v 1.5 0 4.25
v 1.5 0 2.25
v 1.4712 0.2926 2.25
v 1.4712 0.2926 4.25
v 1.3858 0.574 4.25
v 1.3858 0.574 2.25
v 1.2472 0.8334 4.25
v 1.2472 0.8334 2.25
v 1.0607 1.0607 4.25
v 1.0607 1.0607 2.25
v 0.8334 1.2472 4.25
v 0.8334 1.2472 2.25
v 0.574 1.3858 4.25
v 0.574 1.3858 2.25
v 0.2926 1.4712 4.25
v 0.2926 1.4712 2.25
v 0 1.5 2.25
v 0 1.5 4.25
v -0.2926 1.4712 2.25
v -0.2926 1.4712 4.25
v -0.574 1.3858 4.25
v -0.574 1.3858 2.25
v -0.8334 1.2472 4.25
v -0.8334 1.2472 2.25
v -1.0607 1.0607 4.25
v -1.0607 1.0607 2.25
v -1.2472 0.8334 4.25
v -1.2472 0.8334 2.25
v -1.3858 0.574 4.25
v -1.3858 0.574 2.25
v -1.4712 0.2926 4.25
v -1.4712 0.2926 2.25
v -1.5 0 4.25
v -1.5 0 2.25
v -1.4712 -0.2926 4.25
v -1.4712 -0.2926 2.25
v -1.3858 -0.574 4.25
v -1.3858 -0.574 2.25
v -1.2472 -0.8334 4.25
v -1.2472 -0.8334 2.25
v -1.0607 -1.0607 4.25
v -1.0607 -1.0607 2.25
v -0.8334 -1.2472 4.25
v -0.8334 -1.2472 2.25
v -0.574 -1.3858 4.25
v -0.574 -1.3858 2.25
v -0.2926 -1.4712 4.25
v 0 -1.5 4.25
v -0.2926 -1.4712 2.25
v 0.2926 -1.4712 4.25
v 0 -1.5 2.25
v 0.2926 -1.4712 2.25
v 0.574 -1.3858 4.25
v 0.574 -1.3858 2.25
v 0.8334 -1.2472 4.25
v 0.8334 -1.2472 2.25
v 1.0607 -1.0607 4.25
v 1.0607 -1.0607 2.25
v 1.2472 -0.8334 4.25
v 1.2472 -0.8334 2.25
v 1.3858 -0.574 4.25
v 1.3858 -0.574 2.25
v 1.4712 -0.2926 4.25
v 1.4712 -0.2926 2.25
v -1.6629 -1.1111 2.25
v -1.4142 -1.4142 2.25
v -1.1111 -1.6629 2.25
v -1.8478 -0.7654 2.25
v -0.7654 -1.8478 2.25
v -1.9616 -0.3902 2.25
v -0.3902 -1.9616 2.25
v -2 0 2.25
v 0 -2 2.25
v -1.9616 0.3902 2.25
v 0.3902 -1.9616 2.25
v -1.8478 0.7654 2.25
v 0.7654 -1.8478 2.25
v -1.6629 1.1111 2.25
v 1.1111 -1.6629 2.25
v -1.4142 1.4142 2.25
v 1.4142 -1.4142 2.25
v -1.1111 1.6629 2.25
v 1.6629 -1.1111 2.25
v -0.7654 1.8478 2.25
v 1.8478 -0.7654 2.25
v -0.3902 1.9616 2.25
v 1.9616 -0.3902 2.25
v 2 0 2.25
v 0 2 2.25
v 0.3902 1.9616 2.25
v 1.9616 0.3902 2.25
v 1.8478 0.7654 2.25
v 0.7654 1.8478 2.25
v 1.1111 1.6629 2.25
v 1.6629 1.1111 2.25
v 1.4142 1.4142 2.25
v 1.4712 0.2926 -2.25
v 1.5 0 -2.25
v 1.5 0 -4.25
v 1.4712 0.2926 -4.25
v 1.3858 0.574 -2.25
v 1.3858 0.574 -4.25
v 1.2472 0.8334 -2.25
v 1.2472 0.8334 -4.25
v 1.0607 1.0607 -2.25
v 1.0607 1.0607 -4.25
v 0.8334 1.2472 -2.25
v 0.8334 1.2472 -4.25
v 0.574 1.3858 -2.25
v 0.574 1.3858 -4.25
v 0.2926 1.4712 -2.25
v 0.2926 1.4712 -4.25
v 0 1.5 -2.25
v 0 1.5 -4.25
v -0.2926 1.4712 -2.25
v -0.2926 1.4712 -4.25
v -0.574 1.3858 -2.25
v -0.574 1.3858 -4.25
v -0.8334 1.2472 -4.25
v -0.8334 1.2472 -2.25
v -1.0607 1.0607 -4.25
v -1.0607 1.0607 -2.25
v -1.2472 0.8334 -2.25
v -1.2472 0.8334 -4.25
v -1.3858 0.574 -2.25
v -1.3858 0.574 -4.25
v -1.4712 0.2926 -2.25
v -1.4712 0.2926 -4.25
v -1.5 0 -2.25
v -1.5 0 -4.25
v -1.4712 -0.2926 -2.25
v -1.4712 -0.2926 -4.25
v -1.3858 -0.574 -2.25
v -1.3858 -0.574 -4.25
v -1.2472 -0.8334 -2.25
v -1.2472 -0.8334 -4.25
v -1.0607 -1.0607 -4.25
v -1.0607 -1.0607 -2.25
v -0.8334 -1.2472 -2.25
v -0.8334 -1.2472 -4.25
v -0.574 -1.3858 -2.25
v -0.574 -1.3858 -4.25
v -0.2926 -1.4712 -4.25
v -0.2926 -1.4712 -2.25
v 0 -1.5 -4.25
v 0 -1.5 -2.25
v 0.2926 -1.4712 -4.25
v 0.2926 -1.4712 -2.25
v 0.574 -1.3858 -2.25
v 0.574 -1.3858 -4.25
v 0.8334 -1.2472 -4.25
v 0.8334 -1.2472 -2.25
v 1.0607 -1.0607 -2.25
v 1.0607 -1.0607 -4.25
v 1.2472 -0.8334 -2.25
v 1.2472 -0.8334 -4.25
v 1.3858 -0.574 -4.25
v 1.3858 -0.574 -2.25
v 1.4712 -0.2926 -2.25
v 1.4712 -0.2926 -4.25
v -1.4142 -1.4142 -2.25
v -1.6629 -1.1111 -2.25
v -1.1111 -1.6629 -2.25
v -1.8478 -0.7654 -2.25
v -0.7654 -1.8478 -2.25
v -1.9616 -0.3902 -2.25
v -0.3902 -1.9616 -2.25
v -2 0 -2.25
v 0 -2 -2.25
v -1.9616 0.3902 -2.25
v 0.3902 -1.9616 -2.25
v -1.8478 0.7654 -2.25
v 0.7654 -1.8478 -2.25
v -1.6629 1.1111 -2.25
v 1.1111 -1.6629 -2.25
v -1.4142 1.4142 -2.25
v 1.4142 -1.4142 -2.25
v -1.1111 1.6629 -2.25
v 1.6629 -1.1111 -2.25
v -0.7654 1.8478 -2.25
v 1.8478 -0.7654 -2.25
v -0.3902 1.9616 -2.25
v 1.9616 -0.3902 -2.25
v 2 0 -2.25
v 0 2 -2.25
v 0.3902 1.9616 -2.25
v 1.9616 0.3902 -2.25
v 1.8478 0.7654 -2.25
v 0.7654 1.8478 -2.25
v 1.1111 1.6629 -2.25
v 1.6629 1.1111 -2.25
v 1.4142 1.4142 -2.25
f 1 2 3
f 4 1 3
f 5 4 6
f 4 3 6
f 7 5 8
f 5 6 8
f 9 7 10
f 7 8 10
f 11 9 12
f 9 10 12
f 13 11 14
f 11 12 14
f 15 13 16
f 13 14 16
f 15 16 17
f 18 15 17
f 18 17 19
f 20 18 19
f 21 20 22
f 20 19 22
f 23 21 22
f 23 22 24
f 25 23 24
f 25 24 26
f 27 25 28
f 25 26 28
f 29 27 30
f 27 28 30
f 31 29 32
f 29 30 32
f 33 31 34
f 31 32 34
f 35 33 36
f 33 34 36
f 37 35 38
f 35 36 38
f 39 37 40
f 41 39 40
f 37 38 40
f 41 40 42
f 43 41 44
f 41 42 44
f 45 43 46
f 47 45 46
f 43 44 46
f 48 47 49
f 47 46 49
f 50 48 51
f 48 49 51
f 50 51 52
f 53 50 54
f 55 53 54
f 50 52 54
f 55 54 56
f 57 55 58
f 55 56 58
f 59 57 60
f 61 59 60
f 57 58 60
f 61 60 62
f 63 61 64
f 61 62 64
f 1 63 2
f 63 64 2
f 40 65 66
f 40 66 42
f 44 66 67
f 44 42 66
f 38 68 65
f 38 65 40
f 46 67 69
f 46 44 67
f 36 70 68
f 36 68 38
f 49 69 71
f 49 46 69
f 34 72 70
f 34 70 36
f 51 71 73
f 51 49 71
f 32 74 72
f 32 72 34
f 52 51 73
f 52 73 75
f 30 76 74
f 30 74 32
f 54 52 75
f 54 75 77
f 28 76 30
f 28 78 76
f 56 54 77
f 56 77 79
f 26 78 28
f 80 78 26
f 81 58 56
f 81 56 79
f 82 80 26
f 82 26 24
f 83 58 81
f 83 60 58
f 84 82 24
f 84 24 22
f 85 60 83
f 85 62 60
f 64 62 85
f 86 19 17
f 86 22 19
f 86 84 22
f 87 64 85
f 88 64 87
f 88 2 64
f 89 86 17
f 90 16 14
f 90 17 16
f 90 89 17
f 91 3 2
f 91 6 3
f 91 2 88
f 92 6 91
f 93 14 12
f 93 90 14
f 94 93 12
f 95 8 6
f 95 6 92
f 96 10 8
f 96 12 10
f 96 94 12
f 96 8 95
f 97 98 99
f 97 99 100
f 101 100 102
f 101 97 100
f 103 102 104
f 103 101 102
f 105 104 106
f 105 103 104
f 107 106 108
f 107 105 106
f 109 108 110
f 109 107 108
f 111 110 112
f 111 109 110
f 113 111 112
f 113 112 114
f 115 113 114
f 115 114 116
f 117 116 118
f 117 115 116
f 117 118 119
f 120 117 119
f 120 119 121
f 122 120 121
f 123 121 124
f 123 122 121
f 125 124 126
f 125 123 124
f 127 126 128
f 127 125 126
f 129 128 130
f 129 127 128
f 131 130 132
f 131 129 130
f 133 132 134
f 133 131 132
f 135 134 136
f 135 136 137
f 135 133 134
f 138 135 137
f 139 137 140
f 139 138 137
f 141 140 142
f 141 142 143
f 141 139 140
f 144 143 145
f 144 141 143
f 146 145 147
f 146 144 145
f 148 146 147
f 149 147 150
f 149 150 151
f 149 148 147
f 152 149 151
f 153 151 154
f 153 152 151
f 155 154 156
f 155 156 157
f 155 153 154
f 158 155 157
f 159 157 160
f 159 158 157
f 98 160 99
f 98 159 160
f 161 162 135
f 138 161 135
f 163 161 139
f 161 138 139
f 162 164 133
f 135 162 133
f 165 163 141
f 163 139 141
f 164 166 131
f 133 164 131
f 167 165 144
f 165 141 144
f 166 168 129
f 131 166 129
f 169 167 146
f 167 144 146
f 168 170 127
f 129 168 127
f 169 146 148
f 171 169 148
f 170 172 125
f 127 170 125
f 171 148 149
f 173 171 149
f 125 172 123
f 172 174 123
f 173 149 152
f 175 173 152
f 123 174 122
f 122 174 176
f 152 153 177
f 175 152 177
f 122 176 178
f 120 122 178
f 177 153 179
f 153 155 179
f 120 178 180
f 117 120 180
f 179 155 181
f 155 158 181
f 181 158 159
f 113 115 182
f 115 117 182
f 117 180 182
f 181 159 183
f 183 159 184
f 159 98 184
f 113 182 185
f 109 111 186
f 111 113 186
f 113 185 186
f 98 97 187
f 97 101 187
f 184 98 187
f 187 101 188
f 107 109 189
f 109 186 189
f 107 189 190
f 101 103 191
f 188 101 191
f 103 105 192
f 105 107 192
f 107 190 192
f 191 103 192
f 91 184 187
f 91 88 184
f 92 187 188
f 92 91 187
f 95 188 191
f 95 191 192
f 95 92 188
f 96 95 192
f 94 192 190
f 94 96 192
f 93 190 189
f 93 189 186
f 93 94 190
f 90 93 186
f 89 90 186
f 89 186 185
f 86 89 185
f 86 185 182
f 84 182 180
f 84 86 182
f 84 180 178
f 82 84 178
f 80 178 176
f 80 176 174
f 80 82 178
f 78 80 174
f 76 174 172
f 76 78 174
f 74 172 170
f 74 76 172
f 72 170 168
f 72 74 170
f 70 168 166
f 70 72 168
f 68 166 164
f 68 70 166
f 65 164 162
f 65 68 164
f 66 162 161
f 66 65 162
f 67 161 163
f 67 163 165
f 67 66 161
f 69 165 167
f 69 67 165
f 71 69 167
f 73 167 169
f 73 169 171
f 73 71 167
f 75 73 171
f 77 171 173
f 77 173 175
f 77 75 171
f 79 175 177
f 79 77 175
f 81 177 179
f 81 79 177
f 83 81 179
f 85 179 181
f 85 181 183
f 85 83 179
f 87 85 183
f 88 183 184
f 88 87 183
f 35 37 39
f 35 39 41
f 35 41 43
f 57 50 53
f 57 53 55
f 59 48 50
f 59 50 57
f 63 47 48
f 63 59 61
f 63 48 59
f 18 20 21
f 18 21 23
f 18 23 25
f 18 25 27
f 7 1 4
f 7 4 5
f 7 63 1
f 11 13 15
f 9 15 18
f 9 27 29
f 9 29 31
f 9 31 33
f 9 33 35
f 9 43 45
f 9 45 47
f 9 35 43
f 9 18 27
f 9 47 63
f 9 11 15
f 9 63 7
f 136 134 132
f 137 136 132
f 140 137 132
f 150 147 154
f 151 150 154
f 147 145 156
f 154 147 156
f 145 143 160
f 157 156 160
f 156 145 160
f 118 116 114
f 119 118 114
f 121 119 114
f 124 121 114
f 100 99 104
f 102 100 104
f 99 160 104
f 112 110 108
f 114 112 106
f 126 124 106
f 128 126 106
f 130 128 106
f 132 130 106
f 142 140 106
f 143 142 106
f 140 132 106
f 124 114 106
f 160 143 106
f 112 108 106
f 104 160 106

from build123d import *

# Parameters (mm, degrees)
ESQUISSE2_R        = 2
BOSS_EXTRU_1_DEPTH = 2.25
ESQUISSE3_R        = 1.5
BOSS_EXTRU_2_DEPTH = 2


with BuildPart() as part:
    # Esquisse2 → Boss.-Extru.1 (new body)
    with BuildSketch(Plane.XY):
        Circle(ESQUISSE2_R)
    boss_extru_1 = extrude(amount=BOSS_EXTRU_1_DEPTH)

    # Esquisse3 → Boss.-Extru.2 (add)
    with BuildSketch(Plane.XY.offset(2.25)):
        Circle(ESQUISSE3_R)
    boss_extru_2 = extrude(amount=BOSS_EXTRU_2_DEPTH)

    # Symétrie1: Boss.-Extru.1, Boss.-Extru.2 across plane
    add(boss_extru_1.mirror(Plane.XY))
    add(boss_extru_2.mirror(Plane.XY))


solid = part.part
